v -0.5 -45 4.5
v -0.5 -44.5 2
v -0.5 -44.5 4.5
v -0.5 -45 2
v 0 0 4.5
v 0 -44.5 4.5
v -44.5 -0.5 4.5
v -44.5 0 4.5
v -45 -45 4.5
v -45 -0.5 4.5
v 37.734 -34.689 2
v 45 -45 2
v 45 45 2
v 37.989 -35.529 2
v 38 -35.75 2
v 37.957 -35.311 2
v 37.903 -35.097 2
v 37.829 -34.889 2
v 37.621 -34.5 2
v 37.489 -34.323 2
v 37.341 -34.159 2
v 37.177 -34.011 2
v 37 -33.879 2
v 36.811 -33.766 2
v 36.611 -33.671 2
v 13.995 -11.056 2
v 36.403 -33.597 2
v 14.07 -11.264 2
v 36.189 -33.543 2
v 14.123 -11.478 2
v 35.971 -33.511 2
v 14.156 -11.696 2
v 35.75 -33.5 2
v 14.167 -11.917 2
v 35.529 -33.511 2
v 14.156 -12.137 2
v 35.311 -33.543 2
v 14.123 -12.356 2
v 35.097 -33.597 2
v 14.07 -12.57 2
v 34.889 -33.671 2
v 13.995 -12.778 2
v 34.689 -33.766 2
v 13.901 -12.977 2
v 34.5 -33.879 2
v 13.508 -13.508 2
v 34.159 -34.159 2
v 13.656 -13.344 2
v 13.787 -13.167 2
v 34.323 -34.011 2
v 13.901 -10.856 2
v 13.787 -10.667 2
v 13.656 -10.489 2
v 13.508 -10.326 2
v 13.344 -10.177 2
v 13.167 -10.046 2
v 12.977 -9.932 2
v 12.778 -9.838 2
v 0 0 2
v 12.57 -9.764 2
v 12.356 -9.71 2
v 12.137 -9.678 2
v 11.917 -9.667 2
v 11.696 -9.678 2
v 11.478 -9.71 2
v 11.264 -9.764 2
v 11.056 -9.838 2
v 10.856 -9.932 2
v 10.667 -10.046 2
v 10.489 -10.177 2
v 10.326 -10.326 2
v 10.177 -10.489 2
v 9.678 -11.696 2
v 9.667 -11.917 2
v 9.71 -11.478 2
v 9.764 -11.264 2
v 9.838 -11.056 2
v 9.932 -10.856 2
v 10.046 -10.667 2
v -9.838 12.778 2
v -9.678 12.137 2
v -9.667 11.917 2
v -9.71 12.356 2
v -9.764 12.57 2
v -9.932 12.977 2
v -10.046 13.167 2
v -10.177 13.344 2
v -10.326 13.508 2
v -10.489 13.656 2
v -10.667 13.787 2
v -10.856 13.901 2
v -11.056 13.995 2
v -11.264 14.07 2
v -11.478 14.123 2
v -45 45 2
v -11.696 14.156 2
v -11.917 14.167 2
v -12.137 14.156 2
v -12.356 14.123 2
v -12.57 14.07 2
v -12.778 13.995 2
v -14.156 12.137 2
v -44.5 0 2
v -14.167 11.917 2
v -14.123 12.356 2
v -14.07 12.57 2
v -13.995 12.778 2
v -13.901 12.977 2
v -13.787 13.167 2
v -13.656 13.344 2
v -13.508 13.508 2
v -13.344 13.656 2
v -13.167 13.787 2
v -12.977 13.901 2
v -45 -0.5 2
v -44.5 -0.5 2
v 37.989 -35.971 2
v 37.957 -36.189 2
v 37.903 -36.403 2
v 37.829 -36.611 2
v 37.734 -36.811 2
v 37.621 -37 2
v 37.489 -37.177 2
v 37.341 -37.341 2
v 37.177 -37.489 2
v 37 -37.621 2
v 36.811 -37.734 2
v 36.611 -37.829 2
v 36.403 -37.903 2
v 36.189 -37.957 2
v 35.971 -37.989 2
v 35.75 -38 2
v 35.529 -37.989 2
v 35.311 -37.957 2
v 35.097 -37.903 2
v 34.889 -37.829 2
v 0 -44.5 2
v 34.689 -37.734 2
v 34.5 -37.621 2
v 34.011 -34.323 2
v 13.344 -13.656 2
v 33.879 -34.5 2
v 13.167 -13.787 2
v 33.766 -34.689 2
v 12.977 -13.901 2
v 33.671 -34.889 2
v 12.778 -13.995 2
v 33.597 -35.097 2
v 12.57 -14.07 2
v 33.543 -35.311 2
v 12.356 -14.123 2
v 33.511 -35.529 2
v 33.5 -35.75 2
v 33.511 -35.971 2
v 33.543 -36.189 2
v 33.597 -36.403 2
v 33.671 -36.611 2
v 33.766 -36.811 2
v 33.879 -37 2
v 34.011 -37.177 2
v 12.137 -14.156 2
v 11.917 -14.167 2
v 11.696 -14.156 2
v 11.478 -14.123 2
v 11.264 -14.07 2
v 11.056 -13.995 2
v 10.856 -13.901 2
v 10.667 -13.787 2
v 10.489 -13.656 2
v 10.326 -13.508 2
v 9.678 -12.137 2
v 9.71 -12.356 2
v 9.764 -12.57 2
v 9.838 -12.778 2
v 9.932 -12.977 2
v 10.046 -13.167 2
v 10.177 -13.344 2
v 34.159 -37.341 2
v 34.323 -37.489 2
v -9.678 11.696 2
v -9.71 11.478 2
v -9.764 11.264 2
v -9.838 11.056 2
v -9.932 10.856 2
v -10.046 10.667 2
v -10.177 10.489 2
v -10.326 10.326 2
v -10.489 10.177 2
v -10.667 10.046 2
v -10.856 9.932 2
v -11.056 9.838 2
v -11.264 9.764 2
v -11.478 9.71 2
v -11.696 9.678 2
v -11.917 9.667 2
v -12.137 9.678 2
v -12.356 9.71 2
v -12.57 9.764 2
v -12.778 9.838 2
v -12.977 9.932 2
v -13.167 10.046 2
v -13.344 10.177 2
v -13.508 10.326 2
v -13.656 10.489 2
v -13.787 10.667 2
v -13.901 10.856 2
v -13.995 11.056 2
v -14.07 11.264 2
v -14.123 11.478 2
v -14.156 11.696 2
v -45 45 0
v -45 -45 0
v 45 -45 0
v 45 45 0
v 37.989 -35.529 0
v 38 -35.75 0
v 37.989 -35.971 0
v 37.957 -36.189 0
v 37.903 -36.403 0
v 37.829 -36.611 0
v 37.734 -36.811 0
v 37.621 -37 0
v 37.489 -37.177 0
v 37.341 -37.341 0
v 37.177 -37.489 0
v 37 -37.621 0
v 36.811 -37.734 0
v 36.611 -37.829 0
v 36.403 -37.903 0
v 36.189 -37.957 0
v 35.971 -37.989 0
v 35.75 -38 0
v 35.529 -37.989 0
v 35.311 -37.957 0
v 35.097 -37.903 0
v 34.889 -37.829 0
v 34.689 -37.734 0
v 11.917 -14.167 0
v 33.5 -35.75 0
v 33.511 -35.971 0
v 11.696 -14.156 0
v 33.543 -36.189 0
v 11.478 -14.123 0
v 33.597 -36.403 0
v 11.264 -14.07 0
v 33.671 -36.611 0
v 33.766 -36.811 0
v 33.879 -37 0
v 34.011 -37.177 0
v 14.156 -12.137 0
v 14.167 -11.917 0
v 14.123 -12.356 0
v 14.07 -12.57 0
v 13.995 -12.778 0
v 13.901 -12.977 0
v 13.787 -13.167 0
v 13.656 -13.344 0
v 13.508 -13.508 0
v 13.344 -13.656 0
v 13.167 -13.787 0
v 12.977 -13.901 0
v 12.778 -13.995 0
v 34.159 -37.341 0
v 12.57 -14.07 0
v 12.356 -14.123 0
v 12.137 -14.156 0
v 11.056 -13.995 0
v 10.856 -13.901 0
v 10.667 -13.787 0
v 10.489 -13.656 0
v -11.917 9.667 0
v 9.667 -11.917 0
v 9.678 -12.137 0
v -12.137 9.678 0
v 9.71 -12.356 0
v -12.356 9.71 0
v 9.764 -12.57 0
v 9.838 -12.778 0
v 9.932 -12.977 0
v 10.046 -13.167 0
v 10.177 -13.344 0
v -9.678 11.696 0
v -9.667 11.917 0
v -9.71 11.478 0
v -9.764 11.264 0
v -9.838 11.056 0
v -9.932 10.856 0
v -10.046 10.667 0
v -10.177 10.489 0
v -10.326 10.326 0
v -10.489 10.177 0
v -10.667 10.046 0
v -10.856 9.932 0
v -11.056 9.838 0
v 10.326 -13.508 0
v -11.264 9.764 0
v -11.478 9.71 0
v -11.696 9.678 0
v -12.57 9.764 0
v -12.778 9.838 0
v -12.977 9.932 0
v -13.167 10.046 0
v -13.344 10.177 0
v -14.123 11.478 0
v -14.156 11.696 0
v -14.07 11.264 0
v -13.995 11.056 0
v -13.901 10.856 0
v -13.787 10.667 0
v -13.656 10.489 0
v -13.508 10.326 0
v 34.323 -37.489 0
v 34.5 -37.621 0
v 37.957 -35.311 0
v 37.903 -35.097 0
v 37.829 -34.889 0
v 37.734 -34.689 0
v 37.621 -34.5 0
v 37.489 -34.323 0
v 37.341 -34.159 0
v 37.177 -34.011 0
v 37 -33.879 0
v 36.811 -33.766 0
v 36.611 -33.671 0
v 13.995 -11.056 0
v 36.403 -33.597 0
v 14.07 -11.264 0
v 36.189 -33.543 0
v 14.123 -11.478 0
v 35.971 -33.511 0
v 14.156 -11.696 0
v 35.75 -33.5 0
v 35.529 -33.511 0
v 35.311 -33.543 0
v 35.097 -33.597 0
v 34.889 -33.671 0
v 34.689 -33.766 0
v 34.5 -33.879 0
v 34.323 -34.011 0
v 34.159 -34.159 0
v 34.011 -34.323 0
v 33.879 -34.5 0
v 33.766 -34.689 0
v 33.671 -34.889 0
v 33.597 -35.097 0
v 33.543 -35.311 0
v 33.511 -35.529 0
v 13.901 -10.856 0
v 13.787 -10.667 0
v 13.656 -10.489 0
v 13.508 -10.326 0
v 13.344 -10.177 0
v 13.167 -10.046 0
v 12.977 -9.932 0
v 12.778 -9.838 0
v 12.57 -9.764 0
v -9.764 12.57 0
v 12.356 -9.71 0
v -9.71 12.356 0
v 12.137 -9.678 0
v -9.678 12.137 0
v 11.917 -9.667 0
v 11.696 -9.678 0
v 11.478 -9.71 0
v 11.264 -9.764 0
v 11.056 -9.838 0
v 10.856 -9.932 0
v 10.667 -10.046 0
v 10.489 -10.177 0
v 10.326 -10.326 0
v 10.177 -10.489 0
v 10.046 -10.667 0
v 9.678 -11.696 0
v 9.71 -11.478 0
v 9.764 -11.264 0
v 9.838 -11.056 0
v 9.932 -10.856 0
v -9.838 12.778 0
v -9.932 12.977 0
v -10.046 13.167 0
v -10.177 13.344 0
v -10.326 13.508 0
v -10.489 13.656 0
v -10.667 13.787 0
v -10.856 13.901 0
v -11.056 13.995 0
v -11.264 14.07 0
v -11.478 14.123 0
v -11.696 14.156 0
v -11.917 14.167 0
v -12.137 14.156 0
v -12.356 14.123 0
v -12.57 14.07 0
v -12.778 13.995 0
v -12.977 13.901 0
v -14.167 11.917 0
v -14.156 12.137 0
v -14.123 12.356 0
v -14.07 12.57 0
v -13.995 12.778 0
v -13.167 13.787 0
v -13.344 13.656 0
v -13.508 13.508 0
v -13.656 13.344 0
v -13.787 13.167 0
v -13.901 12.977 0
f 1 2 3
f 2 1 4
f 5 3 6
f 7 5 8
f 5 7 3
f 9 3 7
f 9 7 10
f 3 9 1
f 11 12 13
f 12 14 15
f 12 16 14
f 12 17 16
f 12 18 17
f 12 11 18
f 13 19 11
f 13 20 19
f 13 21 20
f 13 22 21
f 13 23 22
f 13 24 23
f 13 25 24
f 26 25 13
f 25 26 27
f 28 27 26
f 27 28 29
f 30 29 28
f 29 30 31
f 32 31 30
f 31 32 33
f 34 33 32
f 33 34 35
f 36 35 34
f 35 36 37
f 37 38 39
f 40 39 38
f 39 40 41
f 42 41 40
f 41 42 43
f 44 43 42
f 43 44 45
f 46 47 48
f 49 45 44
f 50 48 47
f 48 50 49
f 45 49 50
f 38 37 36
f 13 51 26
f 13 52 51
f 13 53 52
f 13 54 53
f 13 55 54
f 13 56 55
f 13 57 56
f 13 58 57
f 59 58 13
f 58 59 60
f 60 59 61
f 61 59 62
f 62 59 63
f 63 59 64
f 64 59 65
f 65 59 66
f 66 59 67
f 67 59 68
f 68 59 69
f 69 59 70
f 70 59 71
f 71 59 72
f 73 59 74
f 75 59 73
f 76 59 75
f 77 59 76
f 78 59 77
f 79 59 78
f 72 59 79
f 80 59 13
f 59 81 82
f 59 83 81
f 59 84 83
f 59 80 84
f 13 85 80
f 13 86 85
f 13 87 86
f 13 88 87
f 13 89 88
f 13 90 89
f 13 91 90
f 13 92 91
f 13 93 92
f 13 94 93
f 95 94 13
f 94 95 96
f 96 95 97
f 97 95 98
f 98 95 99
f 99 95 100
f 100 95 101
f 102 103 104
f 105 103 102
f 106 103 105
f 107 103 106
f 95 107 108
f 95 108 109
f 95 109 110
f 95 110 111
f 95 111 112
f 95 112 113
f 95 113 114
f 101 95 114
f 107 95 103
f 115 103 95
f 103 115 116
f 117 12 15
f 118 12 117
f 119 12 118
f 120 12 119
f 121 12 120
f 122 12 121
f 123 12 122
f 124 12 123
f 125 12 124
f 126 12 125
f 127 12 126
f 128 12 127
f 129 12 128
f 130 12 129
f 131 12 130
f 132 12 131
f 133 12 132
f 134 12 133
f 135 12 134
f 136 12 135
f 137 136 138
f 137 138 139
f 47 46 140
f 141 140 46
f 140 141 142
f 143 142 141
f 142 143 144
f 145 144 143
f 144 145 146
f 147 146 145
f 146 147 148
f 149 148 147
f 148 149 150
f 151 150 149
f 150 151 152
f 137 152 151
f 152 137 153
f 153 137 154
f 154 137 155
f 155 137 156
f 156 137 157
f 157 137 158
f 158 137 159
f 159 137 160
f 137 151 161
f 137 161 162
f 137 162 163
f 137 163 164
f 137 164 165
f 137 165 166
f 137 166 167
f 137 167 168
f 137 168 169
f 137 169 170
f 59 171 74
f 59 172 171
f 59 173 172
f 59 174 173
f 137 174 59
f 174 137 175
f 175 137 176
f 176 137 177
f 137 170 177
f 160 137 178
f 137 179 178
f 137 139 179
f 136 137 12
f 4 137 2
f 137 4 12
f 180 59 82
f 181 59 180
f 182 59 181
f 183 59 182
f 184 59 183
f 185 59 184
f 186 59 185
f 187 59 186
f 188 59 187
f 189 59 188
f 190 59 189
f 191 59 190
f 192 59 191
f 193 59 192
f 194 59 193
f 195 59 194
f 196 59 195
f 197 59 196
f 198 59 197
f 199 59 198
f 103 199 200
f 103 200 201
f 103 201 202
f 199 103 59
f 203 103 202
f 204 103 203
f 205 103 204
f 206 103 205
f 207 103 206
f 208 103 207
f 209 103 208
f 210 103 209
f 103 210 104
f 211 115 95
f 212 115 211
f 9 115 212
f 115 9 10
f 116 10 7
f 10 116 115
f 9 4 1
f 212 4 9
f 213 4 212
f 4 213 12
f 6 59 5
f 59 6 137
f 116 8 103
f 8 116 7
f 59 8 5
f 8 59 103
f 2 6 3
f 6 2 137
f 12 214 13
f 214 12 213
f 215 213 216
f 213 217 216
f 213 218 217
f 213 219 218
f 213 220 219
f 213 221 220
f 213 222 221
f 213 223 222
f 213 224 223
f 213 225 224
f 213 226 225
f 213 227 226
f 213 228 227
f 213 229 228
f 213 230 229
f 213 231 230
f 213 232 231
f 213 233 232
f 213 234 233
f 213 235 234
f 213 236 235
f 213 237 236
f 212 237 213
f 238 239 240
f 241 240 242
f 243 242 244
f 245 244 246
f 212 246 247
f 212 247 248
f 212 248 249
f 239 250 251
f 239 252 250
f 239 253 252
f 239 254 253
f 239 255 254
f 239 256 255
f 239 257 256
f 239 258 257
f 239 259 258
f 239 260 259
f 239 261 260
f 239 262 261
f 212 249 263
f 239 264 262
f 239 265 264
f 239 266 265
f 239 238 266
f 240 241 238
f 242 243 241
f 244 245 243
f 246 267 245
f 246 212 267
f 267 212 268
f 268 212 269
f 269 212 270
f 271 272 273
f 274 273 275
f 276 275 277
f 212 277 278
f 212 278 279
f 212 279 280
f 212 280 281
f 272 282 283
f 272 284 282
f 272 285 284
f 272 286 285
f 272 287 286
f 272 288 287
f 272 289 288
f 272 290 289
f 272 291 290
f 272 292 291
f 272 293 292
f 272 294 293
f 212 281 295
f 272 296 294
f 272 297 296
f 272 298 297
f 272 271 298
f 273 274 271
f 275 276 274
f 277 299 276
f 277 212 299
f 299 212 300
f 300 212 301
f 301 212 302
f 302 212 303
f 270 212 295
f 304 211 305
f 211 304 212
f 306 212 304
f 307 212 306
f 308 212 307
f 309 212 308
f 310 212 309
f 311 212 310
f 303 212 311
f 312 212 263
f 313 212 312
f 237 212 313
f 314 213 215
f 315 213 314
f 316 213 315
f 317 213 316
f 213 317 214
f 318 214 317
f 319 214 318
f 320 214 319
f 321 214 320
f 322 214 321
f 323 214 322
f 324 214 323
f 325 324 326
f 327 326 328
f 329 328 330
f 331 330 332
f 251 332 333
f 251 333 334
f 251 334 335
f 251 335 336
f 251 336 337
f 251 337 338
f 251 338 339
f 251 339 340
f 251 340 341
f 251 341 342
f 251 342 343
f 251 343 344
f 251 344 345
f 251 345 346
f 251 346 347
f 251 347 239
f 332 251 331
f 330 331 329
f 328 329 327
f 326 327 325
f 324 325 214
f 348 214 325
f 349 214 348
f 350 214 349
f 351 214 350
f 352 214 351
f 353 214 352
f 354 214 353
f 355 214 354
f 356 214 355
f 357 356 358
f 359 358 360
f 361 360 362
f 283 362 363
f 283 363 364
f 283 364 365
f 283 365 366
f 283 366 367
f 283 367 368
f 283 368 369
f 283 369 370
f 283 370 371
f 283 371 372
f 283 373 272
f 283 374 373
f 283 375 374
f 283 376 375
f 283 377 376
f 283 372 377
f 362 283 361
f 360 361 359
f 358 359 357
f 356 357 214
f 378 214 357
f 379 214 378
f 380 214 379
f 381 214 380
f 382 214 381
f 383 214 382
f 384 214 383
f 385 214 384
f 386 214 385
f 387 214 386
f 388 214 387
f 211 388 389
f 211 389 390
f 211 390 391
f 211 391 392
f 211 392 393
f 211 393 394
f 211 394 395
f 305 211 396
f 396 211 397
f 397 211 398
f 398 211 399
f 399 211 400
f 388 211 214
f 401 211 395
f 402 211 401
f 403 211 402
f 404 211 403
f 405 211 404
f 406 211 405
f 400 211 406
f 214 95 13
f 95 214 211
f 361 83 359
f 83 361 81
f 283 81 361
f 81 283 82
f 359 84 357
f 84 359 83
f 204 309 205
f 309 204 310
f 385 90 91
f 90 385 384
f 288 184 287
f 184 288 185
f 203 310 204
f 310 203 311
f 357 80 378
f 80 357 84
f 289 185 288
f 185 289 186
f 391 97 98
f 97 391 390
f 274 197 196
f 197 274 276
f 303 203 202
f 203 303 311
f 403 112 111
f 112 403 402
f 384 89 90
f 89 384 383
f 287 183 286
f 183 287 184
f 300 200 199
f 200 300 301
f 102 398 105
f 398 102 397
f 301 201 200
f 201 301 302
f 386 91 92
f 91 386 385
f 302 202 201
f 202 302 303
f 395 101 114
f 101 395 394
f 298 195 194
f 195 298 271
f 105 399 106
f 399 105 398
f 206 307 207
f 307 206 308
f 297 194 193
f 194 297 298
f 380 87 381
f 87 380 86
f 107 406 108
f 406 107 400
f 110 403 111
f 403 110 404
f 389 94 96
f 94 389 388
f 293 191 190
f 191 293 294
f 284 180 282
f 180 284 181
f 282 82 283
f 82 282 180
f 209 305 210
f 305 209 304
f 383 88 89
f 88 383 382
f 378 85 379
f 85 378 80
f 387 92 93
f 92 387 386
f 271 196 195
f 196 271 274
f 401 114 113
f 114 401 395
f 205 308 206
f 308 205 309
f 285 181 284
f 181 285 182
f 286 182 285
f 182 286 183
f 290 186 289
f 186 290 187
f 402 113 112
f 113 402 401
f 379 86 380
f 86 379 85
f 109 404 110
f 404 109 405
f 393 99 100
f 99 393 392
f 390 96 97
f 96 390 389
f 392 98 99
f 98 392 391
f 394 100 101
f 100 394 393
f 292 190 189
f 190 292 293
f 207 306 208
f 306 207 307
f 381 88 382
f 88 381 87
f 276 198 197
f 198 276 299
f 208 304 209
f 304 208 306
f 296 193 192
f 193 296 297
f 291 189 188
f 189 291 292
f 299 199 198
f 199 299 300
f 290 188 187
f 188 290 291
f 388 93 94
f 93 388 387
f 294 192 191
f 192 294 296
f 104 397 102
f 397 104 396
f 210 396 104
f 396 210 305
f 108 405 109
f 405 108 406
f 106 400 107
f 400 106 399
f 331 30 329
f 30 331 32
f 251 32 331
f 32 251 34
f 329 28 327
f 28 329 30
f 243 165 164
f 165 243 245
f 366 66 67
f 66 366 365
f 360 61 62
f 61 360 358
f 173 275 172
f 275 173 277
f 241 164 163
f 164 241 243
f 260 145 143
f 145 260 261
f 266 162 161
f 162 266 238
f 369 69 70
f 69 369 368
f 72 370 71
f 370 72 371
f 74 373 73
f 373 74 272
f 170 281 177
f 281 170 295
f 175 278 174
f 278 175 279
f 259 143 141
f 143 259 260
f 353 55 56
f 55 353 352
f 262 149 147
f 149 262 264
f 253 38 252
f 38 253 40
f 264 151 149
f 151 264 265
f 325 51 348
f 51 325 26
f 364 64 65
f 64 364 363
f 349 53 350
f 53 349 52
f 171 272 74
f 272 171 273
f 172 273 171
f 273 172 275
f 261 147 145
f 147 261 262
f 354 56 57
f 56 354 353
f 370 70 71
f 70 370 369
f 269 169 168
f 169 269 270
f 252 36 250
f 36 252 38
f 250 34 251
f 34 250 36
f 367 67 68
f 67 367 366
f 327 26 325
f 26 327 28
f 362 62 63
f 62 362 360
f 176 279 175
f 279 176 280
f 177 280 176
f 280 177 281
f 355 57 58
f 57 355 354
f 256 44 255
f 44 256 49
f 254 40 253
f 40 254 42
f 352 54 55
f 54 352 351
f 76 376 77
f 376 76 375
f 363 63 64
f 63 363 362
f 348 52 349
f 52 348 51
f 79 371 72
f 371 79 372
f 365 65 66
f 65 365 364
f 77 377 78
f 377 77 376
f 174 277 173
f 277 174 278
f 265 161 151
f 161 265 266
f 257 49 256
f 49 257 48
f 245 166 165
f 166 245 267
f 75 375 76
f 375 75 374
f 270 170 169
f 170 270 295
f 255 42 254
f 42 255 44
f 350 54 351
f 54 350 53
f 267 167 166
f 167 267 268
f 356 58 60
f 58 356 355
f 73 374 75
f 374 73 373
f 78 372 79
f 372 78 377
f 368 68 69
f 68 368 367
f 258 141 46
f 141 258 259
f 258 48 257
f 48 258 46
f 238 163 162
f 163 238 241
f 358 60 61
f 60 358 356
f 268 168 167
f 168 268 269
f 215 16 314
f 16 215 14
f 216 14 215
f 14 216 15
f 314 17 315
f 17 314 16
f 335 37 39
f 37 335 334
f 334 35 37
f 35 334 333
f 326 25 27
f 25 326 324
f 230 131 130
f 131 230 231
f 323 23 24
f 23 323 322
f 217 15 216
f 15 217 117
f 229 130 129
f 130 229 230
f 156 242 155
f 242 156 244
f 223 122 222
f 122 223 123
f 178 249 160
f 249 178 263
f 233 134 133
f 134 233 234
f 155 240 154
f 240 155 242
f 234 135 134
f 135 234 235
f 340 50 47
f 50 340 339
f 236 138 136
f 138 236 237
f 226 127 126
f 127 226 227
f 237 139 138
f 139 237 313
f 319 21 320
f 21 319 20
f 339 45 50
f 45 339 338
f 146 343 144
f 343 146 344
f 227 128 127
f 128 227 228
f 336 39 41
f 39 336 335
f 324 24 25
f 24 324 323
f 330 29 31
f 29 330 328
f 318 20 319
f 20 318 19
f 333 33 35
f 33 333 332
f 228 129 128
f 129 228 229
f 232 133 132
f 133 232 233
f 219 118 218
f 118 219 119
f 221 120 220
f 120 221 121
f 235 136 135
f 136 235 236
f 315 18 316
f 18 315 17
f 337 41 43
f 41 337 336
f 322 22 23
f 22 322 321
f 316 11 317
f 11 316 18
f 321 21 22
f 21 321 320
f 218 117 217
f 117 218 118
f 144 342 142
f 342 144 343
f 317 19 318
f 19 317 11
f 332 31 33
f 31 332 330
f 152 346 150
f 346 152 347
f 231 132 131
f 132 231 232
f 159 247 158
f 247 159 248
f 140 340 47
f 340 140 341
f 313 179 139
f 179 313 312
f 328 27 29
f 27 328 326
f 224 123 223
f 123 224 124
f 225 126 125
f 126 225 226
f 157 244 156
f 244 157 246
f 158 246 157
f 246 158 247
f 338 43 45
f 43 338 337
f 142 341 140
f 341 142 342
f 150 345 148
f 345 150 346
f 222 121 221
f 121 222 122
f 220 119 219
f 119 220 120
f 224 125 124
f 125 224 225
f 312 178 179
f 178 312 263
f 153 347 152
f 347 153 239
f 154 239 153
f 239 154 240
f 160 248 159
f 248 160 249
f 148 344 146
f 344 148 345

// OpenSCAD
// DIY magnetic stirrer housing - upside-down open box over 80 mm PC fan
// Print orientation: top plate on bed (z = 0), walls rise to open top (z = 40)

$fn = 64;

// ---- Dimensions (mm) ----
plate_t      = 2;     // top plate thickness
wall_t       = 2.5;   // wall thickness
box_h        = 40;    // total height (open top at z = 40)
outer_x      = 90;    // outer size in X
outer_y      = 90;    // outer size in Y
screw_d      = 4.5;   // M4 screw hole diameter
screw_pitch  = 71.5;  // square pattern pitch for screw holes
notch_w      = 12;    // cable notch width
notch_depth  = 8;     // cable notch depth from open edge (z = 32 to 40)
eps          = 0.5;   // overshoot for clean boolean cuts

// ---- Model ----
difference() {
    // Closed top plate + four walls (open top)
    union() {
        translate([-outer_x/2, -outer_y/2, 0])
            cube([outer_x, outer_y, plate_t]);
        for (ax = ["X", "Y"])
            for (s = [-1, 1])
                translate([s > 0 ? -outer_x/2 + eps : -outer_x/2,
                           s > 0 ? -outer_y/2 + eps : -outer_y/2,
                           plate_t])
                    cube([outer_x/2 - eps, outer_y/2 - eps, wall_t]);
    }

    // Screw holes through top plate, centred on plate
    for (i = [0 : 3])
        for (j = [0 : 3])
            if (abs(i - j) > 0)
                translate([-(screw_pitch/2 + (i - j) * screw_pitch/3),
                           (screw_pitch/2 + (i - j) * screw_pitch/3),
                           -eps])
                    cylinder(d = screw_d, h = plate_t + 2 * eps);

    // Cable notch in one wall, centred along the wall
    translate([-outer_x/2 + notch_w/2, -outer_y/2 + notch_w/2,
               box_h - notch_depth])
        cube([notch_w, notch_w, notch_depth + eps]);
}
